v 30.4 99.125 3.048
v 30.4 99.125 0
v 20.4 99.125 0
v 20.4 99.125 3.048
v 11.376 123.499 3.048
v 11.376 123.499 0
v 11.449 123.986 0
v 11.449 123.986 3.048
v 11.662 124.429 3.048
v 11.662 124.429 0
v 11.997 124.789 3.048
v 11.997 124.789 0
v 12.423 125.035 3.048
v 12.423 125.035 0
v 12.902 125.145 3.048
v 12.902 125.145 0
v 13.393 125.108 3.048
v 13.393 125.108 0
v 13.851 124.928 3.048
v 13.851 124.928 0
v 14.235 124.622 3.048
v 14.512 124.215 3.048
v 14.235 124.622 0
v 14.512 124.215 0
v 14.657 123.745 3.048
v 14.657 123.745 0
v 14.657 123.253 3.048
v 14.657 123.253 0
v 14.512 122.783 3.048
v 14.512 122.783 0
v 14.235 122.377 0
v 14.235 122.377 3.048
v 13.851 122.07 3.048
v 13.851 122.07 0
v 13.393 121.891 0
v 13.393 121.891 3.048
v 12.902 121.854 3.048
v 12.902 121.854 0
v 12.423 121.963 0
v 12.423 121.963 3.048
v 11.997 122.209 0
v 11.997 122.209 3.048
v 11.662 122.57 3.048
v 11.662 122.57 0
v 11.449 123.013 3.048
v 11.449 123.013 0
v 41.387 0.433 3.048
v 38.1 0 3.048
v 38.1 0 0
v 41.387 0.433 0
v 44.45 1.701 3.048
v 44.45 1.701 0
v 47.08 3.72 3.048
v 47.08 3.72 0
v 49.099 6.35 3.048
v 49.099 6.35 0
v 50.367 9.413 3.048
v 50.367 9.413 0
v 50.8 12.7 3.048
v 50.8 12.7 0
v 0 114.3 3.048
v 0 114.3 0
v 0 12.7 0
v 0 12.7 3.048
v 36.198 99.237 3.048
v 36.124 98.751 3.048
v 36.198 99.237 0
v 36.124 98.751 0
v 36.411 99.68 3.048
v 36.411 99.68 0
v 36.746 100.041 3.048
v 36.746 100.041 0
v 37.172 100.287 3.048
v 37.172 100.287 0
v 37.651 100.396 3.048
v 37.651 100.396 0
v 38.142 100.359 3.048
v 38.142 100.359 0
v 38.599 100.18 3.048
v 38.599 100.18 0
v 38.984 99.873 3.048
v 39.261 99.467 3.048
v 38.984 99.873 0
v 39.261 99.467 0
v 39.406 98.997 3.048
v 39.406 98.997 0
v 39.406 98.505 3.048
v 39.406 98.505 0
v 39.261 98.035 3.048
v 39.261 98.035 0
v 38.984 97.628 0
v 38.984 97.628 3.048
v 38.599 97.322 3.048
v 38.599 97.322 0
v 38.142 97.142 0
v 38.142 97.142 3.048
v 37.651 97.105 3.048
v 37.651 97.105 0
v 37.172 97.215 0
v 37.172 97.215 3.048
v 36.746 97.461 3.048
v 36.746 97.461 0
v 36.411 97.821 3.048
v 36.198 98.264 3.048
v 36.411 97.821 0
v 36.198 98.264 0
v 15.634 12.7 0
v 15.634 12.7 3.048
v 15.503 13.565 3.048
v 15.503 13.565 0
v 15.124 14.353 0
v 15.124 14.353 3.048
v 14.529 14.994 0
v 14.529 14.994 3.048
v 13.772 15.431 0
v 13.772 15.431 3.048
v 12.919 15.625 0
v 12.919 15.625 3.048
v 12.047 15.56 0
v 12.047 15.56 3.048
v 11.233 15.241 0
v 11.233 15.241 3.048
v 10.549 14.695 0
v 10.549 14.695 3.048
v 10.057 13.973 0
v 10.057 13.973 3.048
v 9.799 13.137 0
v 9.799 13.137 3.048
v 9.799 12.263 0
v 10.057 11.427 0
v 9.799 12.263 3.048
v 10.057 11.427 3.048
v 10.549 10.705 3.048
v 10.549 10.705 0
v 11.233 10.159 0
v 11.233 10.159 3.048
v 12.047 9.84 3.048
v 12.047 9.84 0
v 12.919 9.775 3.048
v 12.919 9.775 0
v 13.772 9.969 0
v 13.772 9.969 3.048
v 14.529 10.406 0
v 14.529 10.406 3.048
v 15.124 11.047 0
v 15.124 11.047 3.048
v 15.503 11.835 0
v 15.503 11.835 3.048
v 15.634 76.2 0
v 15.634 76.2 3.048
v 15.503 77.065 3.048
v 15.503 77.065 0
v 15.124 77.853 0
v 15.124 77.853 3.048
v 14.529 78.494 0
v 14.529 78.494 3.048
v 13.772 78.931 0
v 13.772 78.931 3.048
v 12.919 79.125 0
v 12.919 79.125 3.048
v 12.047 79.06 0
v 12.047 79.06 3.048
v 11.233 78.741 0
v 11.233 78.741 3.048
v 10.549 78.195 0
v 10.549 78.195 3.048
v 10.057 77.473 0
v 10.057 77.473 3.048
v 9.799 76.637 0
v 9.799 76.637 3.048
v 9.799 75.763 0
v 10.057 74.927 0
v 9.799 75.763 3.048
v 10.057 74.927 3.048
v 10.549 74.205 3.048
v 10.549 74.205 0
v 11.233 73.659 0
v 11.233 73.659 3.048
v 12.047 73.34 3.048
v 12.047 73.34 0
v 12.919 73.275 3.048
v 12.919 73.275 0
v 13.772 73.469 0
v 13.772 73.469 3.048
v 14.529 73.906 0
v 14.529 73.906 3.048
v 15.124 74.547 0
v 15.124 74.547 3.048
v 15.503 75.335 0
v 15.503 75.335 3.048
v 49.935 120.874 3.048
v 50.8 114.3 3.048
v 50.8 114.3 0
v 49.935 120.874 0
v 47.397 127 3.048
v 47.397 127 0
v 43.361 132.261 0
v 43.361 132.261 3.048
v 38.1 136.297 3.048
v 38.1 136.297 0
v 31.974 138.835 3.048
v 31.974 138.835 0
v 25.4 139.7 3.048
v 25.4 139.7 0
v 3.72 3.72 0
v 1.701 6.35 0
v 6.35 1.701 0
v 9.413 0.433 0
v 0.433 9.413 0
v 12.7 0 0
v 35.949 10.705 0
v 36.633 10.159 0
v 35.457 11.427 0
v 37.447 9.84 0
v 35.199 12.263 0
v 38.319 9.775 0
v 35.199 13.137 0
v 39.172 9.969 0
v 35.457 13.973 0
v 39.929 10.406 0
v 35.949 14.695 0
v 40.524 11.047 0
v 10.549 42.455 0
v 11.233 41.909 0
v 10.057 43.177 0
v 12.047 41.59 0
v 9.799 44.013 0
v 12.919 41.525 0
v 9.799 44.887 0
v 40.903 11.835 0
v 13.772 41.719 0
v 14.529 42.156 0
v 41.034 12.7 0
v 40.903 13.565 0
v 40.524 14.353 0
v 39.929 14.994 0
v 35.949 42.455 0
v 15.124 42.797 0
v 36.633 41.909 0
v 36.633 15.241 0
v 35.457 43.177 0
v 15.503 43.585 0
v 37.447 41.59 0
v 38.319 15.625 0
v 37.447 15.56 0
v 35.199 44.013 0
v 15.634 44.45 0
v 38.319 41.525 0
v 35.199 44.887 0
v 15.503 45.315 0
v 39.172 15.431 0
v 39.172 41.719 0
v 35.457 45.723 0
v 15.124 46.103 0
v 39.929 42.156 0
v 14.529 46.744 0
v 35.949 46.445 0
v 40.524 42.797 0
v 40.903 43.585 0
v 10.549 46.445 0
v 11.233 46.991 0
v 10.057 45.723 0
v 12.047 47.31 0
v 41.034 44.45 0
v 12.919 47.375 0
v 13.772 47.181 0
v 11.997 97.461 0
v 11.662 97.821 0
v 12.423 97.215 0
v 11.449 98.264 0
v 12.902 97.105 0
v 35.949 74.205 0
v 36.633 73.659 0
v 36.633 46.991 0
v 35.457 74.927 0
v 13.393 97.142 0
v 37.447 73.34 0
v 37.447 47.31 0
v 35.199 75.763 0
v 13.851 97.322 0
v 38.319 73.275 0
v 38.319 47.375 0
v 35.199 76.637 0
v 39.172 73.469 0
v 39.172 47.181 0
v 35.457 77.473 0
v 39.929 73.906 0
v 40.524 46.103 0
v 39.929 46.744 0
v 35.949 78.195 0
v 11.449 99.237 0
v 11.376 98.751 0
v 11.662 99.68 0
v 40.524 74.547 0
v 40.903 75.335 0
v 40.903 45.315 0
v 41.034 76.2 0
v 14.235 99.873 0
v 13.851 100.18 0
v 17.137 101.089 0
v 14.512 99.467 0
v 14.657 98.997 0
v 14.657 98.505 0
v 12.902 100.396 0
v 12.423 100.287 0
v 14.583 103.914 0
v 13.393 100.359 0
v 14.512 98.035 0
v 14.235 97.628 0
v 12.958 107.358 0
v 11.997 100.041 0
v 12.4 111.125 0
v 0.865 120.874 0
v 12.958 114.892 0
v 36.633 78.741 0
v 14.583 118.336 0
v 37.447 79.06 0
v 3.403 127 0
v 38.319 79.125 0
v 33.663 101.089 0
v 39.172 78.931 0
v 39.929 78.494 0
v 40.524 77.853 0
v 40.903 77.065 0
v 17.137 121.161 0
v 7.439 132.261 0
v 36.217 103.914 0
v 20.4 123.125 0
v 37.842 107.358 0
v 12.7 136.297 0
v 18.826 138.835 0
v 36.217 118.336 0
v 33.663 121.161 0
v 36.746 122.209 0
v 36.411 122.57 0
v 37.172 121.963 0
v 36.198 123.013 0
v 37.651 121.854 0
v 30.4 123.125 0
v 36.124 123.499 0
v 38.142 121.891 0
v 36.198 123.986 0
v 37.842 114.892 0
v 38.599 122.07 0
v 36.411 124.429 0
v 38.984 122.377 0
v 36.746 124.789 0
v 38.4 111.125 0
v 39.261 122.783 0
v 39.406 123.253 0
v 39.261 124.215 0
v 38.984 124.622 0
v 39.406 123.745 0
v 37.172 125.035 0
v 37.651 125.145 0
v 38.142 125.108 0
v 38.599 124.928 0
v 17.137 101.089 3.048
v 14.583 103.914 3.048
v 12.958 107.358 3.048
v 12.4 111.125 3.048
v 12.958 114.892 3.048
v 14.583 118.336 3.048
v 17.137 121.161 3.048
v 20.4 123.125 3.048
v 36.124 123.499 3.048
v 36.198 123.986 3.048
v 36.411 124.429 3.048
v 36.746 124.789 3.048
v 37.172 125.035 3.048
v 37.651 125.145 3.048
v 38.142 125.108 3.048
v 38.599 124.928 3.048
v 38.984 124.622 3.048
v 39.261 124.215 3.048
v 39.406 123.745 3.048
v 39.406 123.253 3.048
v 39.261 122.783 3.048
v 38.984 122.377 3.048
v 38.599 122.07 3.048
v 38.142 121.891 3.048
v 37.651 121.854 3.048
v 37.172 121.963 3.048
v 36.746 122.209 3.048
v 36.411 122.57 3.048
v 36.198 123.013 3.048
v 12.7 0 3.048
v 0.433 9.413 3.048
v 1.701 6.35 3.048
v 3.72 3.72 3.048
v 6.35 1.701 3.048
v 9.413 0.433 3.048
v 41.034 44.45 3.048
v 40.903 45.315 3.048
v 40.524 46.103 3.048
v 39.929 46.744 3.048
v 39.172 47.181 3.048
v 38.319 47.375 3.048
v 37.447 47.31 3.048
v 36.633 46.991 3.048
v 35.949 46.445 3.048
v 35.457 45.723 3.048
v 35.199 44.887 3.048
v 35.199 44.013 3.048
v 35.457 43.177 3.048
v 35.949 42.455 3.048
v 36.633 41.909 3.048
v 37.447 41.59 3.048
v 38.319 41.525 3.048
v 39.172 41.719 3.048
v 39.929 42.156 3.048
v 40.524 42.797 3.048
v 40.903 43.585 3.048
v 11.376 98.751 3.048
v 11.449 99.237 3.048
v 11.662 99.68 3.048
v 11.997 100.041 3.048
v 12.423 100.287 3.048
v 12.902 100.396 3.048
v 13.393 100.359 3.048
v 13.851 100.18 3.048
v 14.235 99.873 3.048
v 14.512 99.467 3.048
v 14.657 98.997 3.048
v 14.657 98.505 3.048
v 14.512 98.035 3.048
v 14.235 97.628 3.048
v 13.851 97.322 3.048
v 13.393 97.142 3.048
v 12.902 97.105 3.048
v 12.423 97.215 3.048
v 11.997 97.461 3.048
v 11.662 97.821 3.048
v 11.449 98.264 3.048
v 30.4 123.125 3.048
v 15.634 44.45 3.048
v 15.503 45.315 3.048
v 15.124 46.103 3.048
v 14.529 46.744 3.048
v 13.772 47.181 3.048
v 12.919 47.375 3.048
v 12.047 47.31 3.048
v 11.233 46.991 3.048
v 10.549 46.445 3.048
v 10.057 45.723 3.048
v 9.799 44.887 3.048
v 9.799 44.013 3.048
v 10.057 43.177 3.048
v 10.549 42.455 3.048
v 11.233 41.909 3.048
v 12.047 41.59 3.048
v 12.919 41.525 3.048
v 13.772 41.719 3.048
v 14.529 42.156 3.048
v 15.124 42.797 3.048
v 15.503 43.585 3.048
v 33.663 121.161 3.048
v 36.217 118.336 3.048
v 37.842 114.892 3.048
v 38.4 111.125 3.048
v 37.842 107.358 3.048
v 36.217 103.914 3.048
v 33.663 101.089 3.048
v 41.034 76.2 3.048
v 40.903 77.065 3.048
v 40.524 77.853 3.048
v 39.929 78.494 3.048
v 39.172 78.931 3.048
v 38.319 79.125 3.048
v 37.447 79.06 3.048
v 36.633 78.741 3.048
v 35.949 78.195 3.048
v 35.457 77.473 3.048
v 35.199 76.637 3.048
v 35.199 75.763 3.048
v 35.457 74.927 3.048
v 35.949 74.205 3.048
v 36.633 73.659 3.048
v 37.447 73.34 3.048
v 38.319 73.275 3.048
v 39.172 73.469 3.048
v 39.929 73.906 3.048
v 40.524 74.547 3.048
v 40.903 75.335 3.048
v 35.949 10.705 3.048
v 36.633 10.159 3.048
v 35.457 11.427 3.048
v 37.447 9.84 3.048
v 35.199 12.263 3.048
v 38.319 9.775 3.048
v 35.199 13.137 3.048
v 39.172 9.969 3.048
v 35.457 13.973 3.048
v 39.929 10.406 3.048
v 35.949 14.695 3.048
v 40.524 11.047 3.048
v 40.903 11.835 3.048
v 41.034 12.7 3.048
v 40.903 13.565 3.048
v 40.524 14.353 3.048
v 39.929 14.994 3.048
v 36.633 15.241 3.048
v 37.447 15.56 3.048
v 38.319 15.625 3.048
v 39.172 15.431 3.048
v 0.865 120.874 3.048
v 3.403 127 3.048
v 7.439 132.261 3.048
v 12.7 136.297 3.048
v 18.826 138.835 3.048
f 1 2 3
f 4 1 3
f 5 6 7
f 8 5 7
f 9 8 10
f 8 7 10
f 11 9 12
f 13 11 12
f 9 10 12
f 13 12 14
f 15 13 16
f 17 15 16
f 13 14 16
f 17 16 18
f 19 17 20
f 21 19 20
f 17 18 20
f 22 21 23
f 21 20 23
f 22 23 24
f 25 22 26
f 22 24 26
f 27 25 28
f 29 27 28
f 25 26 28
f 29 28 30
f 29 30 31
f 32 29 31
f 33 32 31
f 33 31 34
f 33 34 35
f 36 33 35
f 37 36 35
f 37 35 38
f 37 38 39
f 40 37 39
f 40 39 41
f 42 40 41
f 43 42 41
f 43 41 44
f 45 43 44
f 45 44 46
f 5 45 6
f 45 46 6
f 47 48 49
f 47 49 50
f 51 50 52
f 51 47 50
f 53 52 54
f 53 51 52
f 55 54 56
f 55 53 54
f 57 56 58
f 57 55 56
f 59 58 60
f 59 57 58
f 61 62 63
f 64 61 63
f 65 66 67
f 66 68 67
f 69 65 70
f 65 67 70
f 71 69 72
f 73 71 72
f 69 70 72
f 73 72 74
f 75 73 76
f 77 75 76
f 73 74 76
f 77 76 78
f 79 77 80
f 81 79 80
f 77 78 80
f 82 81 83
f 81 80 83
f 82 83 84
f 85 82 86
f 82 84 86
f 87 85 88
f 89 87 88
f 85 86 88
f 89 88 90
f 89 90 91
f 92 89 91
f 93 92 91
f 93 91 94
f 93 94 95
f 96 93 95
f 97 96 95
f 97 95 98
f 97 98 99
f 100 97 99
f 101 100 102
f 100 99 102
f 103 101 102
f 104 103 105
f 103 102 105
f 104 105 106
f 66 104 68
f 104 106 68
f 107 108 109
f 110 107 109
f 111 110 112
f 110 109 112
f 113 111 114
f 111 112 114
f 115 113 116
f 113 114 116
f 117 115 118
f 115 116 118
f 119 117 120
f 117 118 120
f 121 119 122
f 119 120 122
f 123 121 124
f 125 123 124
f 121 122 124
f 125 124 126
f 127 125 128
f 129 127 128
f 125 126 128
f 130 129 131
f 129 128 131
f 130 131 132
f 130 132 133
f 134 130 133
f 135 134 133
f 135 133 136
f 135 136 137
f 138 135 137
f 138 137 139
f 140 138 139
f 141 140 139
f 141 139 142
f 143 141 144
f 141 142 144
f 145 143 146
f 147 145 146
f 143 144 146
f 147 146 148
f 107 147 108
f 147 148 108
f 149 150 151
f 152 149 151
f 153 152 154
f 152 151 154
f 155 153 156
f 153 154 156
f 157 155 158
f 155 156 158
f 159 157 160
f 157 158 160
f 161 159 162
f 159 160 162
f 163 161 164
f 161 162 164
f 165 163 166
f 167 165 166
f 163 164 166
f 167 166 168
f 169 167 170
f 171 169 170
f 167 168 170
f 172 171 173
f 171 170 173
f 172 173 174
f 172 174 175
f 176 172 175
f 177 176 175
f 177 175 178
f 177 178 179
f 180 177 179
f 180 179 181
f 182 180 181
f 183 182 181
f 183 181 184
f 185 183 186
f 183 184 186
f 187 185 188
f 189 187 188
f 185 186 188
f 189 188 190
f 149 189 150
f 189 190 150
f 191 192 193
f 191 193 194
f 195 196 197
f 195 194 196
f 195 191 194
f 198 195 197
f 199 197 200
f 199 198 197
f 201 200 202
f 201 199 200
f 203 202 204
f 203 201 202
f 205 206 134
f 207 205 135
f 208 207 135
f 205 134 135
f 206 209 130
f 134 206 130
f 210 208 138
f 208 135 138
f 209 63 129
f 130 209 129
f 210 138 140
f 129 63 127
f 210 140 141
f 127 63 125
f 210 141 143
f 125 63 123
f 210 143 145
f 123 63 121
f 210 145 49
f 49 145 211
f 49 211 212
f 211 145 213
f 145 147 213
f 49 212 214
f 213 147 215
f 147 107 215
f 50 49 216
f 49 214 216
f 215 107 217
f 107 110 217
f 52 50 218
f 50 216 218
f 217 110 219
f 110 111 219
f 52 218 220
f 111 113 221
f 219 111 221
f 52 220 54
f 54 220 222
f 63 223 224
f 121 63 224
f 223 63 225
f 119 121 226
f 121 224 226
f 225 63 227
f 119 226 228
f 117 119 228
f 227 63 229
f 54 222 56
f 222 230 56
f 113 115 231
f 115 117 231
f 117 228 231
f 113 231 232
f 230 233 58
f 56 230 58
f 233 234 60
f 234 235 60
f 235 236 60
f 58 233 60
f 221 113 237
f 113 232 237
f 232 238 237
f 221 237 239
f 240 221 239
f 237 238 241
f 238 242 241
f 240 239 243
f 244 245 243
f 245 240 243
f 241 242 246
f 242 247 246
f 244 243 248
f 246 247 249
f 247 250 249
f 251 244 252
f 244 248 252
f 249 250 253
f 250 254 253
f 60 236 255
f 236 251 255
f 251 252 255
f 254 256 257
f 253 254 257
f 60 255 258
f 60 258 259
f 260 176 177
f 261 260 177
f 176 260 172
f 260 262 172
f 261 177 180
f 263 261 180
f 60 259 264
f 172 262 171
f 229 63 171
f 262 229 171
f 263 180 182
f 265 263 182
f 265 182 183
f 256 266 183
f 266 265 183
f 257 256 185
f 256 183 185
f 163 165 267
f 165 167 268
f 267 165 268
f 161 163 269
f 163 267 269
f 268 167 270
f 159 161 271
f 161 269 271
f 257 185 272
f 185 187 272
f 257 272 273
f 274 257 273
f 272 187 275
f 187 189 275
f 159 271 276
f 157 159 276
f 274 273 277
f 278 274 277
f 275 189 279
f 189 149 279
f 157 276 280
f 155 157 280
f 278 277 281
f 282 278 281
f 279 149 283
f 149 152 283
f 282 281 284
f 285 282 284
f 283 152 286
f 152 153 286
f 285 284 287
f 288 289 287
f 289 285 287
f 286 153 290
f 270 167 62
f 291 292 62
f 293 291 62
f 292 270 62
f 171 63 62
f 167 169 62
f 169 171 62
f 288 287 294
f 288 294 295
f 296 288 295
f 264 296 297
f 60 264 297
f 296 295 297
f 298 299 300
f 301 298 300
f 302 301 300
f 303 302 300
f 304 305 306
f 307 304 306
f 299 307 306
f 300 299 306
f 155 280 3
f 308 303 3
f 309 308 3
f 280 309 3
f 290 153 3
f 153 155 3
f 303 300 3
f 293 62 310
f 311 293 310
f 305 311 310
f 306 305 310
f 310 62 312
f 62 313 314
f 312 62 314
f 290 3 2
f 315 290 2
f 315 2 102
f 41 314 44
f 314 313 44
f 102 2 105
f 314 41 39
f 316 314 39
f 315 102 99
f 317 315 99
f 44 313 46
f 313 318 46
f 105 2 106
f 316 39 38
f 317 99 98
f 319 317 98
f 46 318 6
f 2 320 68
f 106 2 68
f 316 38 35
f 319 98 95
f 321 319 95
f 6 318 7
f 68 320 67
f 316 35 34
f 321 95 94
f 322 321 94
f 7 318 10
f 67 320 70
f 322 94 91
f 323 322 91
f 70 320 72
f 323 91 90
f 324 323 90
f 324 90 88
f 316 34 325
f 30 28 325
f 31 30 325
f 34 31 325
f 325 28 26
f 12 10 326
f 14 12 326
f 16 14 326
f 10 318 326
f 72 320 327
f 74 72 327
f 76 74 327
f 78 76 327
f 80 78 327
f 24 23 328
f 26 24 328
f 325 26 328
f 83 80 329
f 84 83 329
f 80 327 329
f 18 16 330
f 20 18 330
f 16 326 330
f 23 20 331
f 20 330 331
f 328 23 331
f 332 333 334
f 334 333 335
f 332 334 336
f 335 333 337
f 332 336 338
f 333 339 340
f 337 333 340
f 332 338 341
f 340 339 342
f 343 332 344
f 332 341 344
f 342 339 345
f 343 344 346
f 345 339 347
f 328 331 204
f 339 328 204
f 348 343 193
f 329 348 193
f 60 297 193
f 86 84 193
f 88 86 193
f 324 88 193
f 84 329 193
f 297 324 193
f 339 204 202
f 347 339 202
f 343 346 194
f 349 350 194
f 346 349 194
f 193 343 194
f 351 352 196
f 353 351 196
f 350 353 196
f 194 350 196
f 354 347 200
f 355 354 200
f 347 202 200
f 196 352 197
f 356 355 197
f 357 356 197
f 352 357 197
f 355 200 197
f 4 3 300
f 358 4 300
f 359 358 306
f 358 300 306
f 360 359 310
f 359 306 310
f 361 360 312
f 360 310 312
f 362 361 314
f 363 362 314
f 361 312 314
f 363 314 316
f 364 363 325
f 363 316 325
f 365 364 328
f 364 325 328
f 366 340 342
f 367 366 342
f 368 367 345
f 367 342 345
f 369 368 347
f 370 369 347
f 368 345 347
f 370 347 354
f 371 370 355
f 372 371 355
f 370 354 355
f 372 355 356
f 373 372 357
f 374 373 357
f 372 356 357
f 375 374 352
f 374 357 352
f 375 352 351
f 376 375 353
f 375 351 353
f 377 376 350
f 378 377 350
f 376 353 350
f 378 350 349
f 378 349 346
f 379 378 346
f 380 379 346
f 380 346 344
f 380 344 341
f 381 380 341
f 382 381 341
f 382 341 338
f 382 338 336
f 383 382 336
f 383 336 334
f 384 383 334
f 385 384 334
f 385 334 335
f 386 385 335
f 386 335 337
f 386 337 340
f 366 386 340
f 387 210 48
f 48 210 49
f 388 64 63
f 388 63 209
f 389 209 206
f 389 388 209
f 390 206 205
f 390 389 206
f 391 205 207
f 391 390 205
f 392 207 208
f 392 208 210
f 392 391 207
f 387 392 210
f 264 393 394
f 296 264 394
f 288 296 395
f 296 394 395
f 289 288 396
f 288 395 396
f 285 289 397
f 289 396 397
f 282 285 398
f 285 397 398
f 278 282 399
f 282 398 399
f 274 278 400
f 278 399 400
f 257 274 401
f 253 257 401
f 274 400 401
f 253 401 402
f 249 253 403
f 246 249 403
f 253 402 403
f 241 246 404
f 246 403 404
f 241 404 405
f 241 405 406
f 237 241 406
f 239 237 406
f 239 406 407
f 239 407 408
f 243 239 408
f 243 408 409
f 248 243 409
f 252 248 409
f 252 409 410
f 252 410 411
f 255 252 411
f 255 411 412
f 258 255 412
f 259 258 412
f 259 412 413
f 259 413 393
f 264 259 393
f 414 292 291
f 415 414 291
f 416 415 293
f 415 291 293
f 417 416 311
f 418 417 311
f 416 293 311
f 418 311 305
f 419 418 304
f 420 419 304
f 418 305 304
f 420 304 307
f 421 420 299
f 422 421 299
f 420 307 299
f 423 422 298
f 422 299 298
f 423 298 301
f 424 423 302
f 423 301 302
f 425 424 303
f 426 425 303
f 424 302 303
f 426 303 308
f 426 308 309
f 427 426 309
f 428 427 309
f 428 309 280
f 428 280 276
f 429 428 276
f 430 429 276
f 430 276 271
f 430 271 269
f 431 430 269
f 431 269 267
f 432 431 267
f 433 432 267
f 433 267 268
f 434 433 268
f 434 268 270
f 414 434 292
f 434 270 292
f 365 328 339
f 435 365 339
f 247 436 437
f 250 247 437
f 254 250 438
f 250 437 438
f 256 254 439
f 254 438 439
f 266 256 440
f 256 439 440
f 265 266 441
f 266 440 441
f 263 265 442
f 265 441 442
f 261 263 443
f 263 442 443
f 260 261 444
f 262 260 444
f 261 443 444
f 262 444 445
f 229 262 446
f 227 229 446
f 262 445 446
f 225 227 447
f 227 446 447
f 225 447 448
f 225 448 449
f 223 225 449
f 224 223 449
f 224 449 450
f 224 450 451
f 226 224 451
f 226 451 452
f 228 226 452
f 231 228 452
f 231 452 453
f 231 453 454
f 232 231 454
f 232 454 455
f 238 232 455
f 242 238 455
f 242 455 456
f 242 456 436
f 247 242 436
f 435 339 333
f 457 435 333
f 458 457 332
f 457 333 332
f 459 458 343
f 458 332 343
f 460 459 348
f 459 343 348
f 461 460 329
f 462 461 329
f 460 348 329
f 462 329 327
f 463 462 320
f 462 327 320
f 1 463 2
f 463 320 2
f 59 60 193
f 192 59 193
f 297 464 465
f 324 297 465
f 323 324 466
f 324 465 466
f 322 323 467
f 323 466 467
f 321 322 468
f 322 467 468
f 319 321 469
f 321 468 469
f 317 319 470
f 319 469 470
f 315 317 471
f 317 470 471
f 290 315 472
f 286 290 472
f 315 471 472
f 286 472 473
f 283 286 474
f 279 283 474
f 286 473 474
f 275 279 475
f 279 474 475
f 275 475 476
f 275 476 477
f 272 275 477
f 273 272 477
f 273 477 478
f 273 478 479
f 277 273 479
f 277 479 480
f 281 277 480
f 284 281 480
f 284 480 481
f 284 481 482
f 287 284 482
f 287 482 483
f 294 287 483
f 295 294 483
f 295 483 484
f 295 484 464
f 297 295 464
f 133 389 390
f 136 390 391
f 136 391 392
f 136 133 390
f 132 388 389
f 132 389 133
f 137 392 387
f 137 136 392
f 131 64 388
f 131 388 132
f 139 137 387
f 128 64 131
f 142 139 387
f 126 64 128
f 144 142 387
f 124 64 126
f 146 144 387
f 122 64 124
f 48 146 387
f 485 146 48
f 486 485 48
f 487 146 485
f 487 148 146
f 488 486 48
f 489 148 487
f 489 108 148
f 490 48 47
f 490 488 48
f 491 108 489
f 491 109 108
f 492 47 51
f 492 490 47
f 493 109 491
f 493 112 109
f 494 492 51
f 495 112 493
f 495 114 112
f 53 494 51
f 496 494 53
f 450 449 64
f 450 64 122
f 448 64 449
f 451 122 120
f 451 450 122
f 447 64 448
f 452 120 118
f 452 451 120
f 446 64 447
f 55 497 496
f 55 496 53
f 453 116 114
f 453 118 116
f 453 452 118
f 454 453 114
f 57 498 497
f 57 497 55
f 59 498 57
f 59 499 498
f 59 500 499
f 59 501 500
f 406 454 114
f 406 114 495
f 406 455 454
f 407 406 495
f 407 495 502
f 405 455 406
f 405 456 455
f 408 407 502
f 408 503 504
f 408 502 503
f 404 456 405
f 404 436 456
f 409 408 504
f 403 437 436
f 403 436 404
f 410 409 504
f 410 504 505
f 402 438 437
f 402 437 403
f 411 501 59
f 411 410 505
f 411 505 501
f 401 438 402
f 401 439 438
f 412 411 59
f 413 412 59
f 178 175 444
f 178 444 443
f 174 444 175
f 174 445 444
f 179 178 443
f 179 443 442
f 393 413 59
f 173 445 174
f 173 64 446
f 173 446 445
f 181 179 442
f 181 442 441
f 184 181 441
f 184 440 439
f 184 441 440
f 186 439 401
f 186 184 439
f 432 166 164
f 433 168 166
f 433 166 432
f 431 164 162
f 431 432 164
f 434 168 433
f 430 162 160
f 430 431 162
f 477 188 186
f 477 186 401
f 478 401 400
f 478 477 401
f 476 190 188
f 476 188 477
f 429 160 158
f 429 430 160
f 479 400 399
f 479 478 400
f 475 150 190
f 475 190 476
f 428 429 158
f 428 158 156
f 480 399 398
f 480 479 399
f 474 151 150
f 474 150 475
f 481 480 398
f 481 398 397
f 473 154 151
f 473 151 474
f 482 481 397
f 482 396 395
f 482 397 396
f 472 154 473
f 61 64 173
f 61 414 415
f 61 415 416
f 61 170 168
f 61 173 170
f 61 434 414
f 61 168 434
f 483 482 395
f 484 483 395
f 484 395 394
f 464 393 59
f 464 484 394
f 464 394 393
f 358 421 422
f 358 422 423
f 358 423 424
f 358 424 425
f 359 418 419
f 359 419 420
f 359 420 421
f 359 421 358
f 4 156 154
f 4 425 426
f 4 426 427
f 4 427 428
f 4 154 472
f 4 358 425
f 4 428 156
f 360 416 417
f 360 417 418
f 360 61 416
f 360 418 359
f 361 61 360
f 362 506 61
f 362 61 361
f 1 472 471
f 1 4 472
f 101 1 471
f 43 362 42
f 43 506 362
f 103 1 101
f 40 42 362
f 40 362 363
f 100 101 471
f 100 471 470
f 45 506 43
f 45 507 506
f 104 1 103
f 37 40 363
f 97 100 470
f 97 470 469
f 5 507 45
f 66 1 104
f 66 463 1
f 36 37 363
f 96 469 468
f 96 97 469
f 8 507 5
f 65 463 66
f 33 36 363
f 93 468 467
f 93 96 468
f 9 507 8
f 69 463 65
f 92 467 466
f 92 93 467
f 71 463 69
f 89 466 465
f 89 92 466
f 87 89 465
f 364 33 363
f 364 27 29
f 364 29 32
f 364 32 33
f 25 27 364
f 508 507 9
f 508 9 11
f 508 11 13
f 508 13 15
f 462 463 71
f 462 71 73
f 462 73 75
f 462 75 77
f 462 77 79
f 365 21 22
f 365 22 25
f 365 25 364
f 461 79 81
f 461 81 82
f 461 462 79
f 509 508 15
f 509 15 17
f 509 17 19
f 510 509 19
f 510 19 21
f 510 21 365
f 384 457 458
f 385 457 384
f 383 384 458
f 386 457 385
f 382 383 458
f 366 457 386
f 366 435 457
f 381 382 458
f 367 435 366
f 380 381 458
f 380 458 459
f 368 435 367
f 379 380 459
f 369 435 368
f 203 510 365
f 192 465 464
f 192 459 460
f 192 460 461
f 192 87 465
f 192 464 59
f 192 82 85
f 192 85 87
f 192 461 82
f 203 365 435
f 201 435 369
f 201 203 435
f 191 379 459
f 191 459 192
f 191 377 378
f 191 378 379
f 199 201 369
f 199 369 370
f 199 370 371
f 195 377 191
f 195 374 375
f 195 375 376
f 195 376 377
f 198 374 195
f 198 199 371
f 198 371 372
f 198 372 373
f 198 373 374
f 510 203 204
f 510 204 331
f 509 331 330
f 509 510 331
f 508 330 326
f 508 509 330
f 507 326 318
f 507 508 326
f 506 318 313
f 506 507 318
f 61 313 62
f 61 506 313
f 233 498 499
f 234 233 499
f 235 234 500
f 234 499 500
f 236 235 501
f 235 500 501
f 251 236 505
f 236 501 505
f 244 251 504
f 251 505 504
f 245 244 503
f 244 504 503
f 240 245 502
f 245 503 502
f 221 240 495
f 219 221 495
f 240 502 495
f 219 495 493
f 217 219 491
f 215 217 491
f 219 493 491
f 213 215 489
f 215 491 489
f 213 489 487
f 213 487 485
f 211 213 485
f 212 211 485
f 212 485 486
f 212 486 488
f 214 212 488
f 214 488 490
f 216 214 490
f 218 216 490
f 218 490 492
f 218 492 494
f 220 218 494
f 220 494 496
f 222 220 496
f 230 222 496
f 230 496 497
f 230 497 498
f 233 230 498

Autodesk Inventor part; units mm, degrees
ref_plane "YZ Plane" through (0, 0, 0) normal (1, 0, 0) x (0, 1, 0)
ref_plane "XZ Plane" through (0, 0, 0) normal (0, 1, 0) x (-1, 0, 0)
ref_plane "XY Plane" through (0, 0, 0) normal (0, 0, 1) x (1, 0, 0)
sketch "Sketch1" plane through (0, 0, 0) normal (0, 0, 1) x (1, 0, 0)
  line L0 (0, 0) -> (50.8, 0)
  line L1 (50.8, 0) -> (50.8, 139.7)
  line L2 (50.8, 139.7) -> (0, 139.7)
  line L3 (0, 139.7) -> (0, 0)
  dimension "d0" = 50.8
  dimension "d1" = 139.7
extrude "Plate1" add sketch "Sketch1" along normal blind 3.048
fillet "Corner Round1" radius 25.4 1 edges at (50.8, 139.7, 1.524)
fillet "Corner Round1" radius 25.4 1 edges at (0, 139.7, 1.524)
fillet "Corner Round2" radius 12.7 2 edges at (50.8, 0, 1.524) (0, 0, 1.524)
sketch "Sketch2" plane through (0, 0, 0) normal (0, 0, -1) x (-1, 0, 0)
  arc A0 (-20.4, 99.125) -> (-20.4, 123.125) centre (-25.4, 111.125) ccw projected
  line L0 (-20.4, 123.125) -> (-30.4, 123.125) projected
  line L1 (-30.4, 99.125) -> (-20.4, 99.125) projected
  arc A1 (-30.4, 123.125) -> (-30.4, 99.125) centre (-25.4, 111.125) ccw projected
  circle A2 centre (-13.0256, 98.7506) radius 1.65 projected
  circle A3 centre (-37.7744, 123.4994) radius 1.65 projected
  circle A4 centre (-13.0256, 123.4994) radius 1.65 projected
  circle A5 centre (-37.7744, 98.7506) radius 1.65 projected
  point P0 (0, 0)
extrude "Extrusion1" cut sketch "Sketch2" against normal up to surface (3.048 mm away)
sketch "Sketch3" plane through (0, 0, 3.048) normal (0, 0, 1) x (1, 0, 0)
  circle A0 centre (12.7, 76.2) radius 2.9337 projected
  circle A1 centre (38.1, 76.2) radius 2.9337 projected
  circle A2 centre (38.1, 44.45) radius 2.9337 projected
  circle A3 centre (12.7, 44.45) radius 2.9337 projected
  circle A4 centre (12.7, 12.7) radius 2.9337 projected
  circle A5 centre (38.1, 12.7) radius 2.9337 projected
  circle A6 centre (12.7, 12.7) radius 2.9337 projected
  point P0 (0, 0)
extrude "Extrusion2" cut sketch "Sketch3" against normal up to surface (3.048 mm away)
equation "\"d10\" = Thickness"
equation "\"BendRadius\" = Thickness"
equation "\"BendReliefWidth\" = Thickness"
equation "\"BendReliefDepth\" = 0.5 * Thickness"
equation "\"CornerReliefSize\" = 4 * Thickness"
equation "\"MinimumRemnant\" = 2 * Thickness"
equation "\"TransitionRadius\" = BendRadius"
equation "\"JacobiRadiusSize\" = Thickness"
equation "\"GapSize\" = Thickness"
equation "\"d2\" = BendRadius"
equation "\"Thickness\" = 3.048"
properties part number "pG188Mount"
